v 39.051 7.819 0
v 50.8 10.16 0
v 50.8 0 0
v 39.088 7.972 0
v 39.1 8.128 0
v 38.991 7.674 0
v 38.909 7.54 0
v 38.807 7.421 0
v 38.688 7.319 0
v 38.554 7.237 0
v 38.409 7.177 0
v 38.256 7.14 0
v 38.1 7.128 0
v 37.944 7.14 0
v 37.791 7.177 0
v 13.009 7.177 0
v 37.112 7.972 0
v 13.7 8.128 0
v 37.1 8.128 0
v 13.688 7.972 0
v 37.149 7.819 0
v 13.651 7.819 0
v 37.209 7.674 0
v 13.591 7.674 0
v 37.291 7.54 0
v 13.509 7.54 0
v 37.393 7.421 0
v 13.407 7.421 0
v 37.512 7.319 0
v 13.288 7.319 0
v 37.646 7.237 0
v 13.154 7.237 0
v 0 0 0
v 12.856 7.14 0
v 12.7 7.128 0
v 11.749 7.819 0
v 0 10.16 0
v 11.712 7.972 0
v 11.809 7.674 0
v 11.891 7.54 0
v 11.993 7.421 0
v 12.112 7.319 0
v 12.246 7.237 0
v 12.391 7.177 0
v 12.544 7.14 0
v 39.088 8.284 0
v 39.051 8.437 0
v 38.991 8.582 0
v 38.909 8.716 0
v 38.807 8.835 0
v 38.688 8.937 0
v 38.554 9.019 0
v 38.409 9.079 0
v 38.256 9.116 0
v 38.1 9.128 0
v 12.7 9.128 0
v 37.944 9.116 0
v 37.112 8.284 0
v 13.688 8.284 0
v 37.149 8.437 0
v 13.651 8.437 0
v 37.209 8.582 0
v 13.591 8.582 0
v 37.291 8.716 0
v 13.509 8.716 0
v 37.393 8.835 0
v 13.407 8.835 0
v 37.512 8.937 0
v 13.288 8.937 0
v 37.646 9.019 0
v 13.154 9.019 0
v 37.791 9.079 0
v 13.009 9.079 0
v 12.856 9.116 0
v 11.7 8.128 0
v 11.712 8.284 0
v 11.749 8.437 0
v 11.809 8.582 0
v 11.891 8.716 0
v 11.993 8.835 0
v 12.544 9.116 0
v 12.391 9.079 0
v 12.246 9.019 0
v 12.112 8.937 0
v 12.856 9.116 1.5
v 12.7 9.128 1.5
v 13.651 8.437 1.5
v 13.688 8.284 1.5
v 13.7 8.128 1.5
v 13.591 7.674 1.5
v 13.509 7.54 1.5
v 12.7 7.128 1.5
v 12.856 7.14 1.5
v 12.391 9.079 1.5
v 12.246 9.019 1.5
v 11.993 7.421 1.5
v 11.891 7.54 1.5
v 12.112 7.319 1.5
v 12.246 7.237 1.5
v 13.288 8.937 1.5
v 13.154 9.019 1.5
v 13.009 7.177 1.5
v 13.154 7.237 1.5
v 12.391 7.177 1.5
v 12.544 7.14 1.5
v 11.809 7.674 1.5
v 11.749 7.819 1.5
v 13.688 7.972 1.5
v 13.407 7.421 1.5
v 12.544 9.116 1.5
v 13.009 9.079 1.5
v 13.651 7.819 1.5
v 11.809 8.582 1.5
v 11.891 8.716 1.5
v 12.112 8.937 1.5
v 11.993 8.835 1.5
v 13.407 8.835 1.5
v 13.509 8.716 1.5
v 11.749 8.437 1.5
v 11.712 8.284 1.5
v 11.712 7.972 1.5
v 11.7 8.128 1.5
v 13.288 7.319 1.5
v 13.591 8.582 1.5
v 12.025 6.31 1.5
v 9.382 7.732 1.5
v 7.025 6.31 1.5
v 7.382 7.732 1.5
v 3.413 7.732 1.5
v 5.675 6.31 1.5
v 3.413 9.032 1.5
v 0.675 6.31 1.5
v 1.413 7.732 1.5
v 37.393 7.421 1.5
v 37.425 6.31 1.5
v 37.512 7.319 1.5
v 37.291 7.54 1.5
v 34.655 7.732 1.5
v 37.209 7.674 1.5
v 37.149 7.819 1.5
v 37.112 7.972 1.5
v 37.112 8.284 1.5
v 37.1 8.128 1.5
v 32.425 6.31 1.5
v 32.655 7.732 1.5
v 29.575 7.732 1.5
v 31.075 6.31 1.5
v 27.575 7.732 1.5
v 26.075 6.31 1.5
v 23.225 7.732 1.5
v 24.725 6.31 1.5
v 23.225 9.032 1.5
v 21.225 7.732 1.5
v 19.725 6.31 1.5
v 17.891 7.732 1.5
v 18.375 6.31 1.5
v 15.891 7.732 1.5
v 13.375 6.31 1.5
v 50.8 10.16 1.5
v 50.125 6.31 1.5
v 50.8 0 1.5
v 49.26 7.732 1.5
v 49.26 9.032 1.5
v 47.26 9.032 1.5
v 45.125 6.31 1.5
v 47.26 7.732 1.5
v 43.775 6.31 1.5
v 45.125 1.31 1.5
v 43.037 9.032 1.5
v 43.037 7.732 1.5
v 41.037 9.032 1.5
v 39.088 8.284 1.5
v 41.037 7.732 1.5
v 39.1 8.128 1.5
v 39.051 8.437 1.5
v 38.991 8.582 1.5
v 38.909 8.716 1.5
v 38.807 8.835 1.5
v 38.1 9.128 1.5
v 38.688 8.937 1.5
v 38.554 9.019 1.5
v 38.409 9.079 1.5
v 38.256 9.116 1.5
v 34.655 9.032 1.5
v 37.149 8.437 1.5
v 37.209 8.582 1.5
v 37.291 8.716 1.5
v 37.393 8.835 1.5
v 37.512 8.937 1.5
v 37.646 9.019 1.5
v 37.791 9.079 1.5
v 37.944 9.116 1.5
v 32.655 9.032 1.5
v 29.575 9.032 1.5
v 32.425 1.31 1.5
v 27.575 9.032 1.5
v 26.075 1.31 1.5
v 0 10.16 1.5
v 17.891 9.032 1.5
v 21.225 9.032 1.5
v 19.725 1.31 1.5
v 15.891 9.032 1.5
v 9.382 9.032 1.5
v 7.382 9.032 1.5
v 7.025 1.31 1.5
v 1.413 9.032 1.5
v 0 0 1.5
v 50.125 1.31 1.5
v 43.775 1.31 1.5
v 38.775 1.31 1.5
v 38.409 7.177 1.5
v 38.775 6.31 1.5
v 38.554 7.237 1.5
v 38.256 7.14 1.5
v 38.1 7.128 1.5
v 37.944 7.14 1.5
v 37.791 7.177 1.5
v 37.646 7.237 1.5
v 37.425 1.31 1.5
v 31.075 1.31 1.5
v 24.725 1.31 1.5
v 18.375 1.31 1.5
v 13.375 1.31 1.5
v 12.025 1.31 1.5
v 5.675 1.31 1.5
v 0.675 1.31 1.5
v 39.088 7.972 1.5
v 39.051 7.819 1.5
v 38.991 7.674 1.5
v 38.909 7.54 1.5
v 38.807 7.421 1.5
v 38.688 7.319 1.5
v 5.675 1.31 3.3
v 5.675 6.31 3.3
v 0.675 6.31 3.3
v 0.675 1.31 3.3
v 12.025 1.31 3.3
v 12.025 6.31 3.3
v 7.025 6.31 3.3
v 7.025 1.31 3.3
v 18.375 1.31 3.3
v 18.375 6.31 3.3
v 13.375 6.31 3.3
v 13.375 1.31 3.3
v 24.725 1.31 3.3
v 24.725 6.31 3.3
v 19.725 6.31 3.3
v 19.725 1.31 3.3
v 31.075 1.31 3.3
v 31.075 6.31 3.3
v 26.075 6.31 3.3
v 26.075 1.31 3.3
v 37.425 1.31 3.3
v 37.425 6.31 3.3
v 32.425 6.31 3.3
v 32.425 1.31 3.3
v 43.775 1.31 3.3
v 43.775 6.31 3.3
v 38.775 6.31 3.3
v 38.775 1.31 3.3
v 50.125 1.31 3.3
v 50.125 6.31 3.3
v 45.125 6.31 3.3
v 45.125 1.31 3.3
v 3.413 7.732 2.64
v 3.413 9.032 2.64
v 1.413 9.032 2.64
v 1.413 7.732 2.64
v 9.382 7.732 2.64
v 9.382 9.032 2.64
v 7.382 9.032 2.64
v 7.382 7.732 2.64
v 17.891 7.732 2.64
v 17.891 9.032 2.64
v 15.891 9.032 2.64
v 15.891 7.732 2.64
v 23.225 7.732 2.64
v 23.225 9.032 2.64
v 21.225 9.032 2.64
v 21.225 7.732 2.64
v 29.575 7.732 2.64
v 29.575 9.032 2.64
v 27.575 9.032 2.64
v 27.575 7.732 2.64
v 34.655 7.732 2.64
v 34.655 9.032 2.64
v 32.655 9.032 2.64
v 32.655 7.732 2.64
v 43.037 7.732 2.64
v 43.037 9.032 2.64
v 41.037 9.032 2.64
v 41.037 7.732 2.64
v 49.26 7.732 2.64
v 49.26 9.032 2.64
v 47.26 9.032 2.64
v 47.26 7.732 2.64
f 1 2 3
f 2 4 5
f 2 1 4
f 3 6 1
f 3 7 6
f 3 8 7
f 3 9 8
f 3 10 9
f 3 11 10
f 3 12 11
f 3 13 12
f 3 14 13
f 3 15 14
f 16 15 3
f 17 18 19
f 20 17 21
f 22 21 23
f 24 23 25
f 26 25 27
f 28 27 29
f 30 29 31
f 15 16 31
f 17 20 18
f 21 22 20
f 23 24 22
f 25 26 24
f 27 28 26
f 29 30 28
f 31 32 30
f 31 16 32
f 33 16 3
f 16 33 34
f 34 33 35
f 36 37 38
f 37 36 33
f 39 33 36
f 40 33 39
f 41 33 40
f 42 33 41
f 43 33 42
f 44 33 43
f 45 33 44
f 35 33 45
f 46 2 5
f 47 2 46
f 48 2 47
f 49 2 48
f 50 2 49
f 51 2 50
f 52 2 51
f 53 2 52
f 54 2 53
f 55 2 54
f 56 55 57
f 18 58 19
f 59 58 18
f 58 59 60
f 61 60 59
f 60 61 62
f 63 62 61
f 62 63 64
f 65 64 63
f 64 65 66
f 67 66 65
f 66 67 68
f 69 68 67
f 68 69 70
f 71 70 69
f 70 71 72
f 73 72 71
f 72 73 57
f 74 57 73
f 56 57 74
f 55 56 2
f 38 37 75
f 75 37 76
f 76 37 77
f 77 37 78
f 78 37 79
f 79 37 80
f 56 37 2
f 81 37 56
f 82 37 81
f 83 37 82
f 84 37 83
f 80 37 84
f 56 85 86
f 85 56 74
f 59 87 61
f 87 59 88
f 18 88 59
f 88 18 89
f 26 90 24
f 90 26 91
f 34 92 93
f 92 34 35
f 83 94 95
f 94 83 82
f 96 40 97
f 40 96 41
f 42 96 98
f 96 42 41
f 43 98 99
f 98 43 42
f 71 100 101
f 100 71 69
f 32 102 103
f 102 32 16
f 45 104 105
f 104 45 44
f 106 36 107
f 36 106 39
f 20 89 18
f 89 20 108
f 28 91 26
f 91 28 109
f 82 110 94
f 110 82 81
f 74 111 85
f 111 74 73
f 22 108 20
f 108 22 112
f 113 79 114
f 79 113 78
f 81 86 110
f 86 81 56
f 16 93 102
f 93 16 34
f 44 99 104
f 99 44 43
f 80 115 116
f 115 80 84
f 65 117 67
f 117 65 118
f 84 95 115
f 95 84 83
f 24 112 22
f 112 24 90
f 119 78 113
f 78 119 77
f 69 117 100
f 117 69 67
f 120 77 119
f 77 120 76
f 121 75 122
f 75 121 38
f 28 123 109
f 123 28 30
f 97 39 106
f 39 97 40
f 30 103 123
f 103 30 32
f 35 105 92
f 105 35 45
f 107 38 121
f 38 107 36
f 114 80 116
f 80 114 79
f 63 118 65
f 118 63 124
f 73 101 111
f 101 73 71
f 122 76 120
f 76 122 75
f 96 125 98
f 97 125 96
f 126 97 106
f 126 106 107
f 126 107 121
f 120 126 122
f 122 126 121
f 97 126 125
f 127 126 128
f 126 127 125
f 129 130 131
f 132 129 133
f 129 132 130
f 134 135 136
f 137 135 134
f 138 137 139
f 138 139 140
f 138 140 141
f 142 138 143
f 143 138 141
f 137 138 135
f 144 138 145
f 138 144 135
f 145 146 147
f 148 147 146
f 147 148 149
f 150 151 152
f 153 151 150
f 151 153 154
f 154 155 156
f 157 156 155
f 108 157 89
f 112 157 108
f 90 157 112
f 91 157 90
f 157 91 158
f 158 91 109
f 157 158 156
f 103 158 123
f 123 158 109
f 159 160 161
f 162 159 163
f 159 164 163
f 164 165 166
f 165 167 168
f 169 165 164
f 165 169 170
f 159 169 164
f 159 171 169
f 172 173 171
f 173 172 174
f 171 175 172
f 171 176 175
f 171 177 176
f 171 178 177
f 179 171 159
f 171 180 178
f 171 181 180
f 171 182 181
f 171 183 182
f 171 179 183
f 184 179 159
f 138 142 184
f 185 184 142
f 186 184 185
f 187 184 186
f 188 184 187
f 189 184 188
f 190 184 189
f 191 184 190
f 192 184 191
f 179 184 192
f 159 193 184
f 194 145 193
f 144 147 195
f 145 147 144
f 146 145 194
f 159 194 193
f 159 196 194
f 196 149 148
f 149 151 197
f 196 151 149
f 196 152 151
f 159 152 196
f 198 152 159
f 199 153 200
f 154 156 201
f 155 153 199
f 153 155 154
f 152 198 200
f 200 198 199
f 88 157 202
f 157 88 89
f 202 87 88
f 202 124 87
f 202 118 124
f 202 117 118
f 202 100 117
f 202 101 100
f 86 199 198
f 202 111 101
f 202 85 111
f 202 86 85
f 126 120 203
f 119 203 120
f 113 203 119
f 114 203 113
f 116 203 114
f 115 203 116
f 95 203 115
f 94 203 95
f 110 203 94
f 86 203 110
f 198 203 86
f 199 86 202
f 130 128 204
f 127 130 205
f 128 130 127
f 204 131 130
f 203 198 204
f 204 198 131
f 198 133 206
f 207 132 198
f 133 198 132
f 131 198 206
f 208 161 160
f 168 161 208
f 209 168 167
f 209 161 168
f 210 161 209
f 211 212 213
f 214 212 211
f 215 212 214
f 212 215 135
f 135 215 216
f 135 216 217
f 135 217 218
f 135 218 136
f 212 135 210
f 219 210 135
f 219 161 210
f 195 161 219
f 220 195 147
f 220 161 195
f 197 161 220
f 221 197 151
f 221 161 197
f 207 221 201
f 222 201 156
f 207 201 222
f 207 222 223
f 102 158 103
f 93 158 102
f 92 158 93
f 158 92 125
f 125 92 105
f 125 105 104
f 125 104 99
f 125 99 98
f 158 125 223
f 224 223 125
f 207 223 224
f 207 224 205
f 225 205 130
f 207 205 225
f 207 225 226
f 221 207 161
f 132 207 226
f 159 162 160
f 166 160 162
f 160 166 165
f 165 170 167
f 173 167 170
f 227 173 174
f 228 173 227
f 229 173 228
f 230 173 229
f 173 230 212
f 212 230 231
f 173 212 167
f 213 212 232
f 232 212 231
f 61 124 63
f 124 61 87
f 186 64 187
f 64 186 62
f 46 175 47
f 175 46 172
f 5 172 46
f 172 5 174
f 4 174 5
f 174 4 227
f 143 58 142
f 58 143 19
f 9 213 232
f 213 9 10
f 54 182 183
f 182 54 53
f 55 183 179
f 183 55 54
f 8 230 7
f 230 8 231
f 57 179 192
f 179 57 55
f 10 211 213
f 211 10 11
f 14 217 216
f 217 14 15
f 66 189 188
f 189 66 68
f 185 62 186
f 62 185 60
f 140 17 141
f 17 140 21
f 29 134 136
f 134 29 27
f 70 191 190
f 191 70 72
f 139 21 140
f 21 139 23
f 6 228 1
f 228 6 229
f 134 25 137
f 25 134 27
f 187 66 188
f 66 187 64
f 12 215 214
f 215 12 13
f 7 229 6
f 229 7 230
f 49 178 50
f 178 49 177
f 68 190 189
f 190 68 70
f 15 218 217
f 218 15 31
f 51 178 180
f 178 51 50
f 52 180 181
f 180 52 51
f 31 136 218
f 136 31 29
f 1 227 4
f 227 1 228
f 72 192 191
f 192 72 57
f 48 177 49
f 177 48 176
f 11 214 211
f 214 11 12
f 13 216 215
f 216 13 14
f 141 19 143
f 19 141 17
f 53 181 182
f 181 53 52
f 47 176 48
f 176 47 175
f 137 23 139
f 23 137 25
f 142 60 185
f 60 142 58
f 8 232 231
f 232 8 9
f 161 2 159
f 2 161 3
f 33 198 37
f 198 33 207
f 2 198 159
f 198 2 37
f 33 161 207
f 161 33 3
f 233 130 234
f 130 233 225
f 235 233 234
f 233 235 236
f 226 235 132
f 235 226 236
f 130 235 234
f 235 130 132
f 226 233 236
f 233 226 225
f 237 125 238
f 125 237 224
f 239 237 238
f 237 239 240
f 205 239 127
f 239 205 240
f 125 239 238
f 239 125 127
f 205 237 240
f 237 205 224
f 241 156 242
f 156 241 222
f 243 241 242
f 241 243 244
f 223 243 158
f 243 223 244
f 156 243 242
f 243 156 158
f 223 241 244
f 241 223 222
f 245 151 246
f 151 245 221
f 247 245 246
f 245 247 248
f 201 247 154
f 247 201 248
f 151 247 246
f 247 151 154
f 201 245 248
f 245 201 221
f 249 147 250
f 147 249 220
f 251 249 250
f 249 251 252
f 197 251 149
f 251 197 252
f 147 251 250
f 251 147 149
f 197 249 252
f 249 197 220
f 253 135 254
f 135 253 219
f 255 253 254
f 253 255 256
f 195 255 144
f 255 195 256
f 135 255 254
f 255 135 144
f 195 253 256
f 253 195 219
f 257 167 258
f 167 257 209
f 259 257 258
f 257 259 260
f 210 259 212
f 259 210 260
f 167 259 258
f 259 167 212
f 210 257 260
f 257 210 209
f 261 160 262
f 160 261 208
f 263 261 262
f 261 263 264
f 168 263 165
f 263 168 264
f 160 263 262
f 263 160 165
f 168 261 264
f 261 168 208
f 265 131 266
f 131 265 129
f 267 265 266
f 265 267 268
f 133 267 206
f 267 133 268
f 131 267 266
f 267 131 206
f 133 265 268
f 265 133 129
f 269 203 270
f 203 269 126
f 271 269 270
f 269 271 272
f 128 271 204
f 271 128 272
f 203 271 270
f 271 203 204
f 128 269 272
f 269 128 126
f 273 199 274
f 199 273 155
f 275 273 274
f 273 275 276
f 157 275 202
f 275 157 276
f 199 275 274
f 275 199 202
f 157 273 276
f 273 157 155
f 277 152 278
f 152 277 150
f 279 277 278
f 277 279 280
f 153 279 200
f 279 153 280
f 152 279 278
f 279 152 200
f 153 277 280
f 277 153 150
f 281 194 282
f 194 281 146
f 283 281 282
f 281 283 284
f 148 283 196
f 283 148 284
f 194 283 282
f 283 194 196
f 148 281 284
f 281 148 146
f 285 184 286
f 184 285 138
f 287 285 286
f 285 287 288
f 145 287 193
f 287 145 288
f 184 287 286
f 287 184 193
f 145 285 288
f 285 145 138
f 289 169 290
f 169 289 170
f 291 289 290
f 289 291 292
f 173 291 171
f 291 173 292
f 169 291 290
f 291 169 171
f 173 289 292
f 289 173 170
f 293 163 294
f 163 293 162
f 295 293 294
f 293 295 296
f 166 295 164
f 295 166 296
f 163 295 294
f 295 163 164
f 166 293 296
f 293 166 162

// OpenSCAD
// ****************************************************************************
//
// File: neopixel_x8_stick_assy_animate.scad
//
// Description:
//   Top-level Assembly Animation for Adafruit "NeoPixel 8 Stick" products,
//   along with a wiring harness and front/back case halves for
//   mounting of the NeoPixel Stick to other projects.
//
//   Comment out various design entities in the 'union()' block below
//   in order to perform fit-checks and visualize how the overall assembly
//   is put together.
//
// Author: Keith Pflieger
// Date:   April 2021
// License: CC BY-NC-SA 4.0
//          (Creative Commons: Attribution-NonCommercial-ShareAlike)
// Thingiverse user: RoboticDreams
// github: pfliegster (https://github.com/pfliegster)
//
// ****************************************************************************

$include_front = true;
include <../neopixel_x8_stick_case_front.scad>

$include_back = true;
include <../neopixel_x8_stick_case_back.scad>

$include_pwb = true;
include <../neopixel_x8_stick_pwb.scad>

$include_wiring_harness = true;
include <../neopixel_wiring_harness.scad>

// Set various enclosure options here:
screw_case = true;      // 'true' for screw-in version of enclosure, 'false' for simple enclosure
screw_type = "flat";    // set enclosure screw type to "none", "round", "cylinder" or "flat"
flush_case = true;      // Used to modify back enclosure piece to be flush with the top around the perimeter
case_screw_length = 10; // length of the physical mounting screws
include_screws = true;  // include M3 screws for assembly visualization?
include_nuts = true;    // include M3 nuts for assembly visualization?
case_thickness = 10.25; // Overall Enclosure thickness (front and back parts assembled)
case_screw_separation = 60.0;     // Center-to-Center distance of the two case mounting screws
add_back_mounting_screws = false; // Add Mounting screws to back enclosure part

// Derived variables:
case_screw_offset = (case_screw_separation - ada_nps8_pwb_length)/2;
back_surface_z = case_thickness - front_surface_z;

// Computed Positions for Mounting Hardware:
case_screw1_pos = [  -case_screw_offset,
                    ada_nps8_pwb_width/2,
                    ada_nps8_pwb_height + front_surface_z - case_screw_length];
case_screw2_pos = [  ada_nps8_pwb_length + case_screw_offset,
                    ada_nps8_pwb_width/2,
                    ada_nps8_pwb_height + front_surface_z - case_screw_length];
case_nut1_pos = [    -case_screw_offset,
                    ada_nps8_pwb_width/2,
                    ada_nps8_pwb_height - back_surface_z];
case_nut2_pos = [    ada_nps8_pwb_length + case_screw_offset,
                    ada_nps8_pwb_width/2,
                    ada_nps8_pwb_height - back_surface_z];

// The constants which will drive the various animation steps:
// Start with display of PWB Only
anim_t1 = 0.1;
// Next, Add Wiring Harness with Z offset and slowly move into place next to PWB
anim_t2 = 0.2;
anim_delta2 = anim_t2 - anim_t1;
anim_off_z2 = -20;
// Then, Add Enclosure Back part, offset and rotated to start
anim_t3 = 0.3;
anim_delta3 = anim_t3 - anim_t2;
anim_off_z3 = -40;
anim_rot_z3 = -90;
// ... start moving back enclosure towards PWB past connector backshell
anim_t4 = 0.4;
anim_delta4 = anim_t4 - anim_t3;
anim_off_z4 = -40;
anim_rot_z4 = -90;
// ... then rotate part to be aligned with PWB again once past the connector
anim_t5 = 0.5;
anim_delta5 = anim_t5 - anim_t4;
anim_off_z5 = -15;
anim_rot_z5 = anim_rot_z4;
// ... and finally move Back part into position with PWB sitting inside of it.
anim_t6 = 0.55;
anim_delta6 = anim_t6 - anim_t5;
anim_off_z6 = -5;
// Now Add Enclosure Front part with Z offset
anim_t7 = 0.6;
anim_delta7 = anim_t7 - anim_t6;
anim_off_z7 = 25;
// Fade transparency on front part ...
anim_t8 = 0.65;
anim_delta8 = anim_t8 - anim_t7;
// Finally, Move enclosure front part into place on top of the rest of the assembly
anim_t9 = 0.75;
anim_delta9 = anim_t9 - anim_t8;
anim_off_z9 = 25;
// Fade transparency back off on front part ...
anim_t10 = 0.80;
anim_delta10 = anim_t10 - anim_t9;

// Animation constants for mounting hardware:
anim_s1_viz = 0.75;
anim_s2_viz = 0.77;
anim_n1_viz = 0.79;
anim_n2_viz = 0.81;
anim_s1_start = 0.79;
anim_s2_start = 0.82;
anim_n1_start = 0.82;
anim_n2_start = 0.85;
anim_s1_end = 0.89;
anim_s2_end = 0.92;
anim_n1_end = 0.89;
anim_n2_end = 0.92;
anim_s1_delta = anim_s1_end - anim_s1_start;
anim_s2_delta = anim_s2_end - anim_s2_start;
anim_n1_delta = anim_n1_end - anim_n1_start;
anim_n2_delta = anim_n2_end - anim_n2_start;
anim_s1_z_offset = 20;
anim_s2_z_offset = 20;
anim_n1_z_offset = -13;
anim_n2_z_offset = -13;

union() {
    // The PWB is always there and stationary:
    if ($include_pwb) ada_nps8_pwb_model($fn=40);

    // Animate the Wiring Harness Model:
    if ($include_wiring_harness) {
        if ($t > anim_t1) {
            translate([0, 0, ($t<anim_t2)?
                anim_off_z2*(1 - ($t - anim_t1)/anim_delta2) : 0])
                neopixel_wiring_harness( num_conductor = 4, harness_length = 20,
                                connector_type = "socket", $fn=40);
        } else if ($t > 0.75*anim_t1) {
            translate([0, 0, anim_off_z2])
                neopixel_wiring_harness( num_conductor = 4, harness_length = 20,
                                connector_type = "socket", $fn=40);
        }
    }
    
    // Animate the Enclosure Back Model Part in multi-stages:
    if ($include_back) {
        if ($t > anim_t5) {
            translate([0, 0, ($t<anim_t6)? anim_off_z6*(1 - ($t - anim_t5)/anim_delta6) : 0])
                neopixel_stick_case_back (
                    screw_case = screw_case,
                    case_screw_separation = case_screw_separation,
                    case_thickness = case_thickness,
                    add_back_mounting_screws = add_back_mounting_screws,
                    flush_perim = flush_case,
                    include_nut_pocket = true,
                    nut_pocket_depth = 3.5,
                    back_alpha = 1.0
                );
        } else if ($t > anim_t4) {
            translate([ada_nps8_pwb_length/2, ada_nps8_pwb_width/2, 0]) {
                rotate([0, 0, ($t<anim_t5)? anim_rot_z5*(1 - ($t - anim_t4)/anim_delta5) : 0]) {
                    translate([-ada_nps8_pwb_length/2, -ada_nps8_pwb_width/2, 
                        (anim_off_z5-anim_off_z6)*(1 - ($t - anim_t4)/anim_delta5) + anim_off_z6])
                        neopixel_stick_case_back (
                            screw_case = screw_case,
                            case_screw_separation = case_screw_separation,
                            case_thickness = case_thickness,
                            add_back_mounting_screws = add_back_mounting_screws,
                            flush_perim = flush_case,
                            include_nut_pocket = true,
                            nut_pocket_depth = 3.5,
                            back_alpha = 1.0
                        );
                }
            }
        } else if ($t > anim_t3) {
            translate([ada_nps8_pwb_length/2, ada_nps8_pwb_width/2, 0]) {
                rotate([0, 0, anim_rot_z4]) {
                    translate([-ada_nps8_pwb_length/2, -ada_nps8_pwb_width/2, 
                        (anim_off_z4-anim_off_z5)*(1 - ($t - anim_t3)/anim_delta4) + anim_off_z5])
                        neopixel_stick_case_back (
                            screw_case = screw_case,
                            case_screw_separation = case_screw_separation,
                            case_thickness = case_thickness,
                            add_back_mounting_screws = add_back_mounting_screws,
                            flush_perim = flush_case,
                            include_nut_pocket = true,
                            nut_pocket_depth = 3.5,
                            back_alpha = 1.0
                        );
                }
            }
        } else if ($t > anim_t2 + 0.75*anim_delta3) {
            translate([ada_nps8_pwb_length/2, ada_nps8_pwb_width/2, 0]) {
                rotate([0, 0, anim_rot_z3]) {
                    translate([-ada_nps8_pwb_length/2, -ada_nps8_pwb_width/2, anim_off_z3])
                        neopixel_stick_case_back (
                            screw_case = screw_case,
                            case_screw_separation = case_screw_separation,
                            case_thickness = case_thickness,
                            add_back_mounting_screws = add_back_mounting_screws,
                            flush_perim = flush_case,
                            include_nut_pocket = true,
                            nut_pocket_depth = 3.5,
                            back_alpha = 1.0
                        );
                }
            }
        }
    }
    
    // Animate the Enclosure Front Model Part:
    if ($include_front) {
        if ($t > anim_t10) {
            neopixel_stick_case_front(
                screw_case = screw_case,
                screw_type = screw_type,
                case_screw_separation = case_screw_separation,
                front_alpha = 1.0);
        } else if ($t > anim_t9) {
            neopixel_stick_case_front(
                screw_case = screw_case,
                screw_type = screw_type,
                case_screw_separation = case_screw_separation,
                front_alpha = 0.5 + 0.5*($t-anim_t9)/anim_delta10 );
        } else if ($t > anim_t8) {
            translate([0, 0, ($t<anim_t9)? anim_off_z9*(1 - ($t - anim_t8)/anim_delta9) : 0])
                neopixel_stick_case_front(
                    screw_case = screw_case,
                    screw_type = screw_type,
                    case_screw_separation = case_screw_separation,
                    front_alpha = 0.5);
        } else if ($t > anim_t7) {
            translate([0, 0, anim_off_z7])
                neopixel_stick_case_front(
                    screw_case = screw_case,
                    screw_type = screw_type,
                    case_screw_separation = case_screw_separation,
                    front_alpha = 1.0 - 0.5*($t-anim_t7)/anim_delta8 );
        } else if ($t > anim_t6 + 0.75*anim_delta7) {
            translate([0, 0, anim_off_z7])
                neopixel_stick_case_front(
                    screw_case = screw_case,
                    screw_type = screw_type,
                    case_screw_separation = case_screw_separation,
                    front_alpha = 1.0);
        }
    }
    
    // Animate the Enclosure Mounting Hardware:
    if (include_screws) {
        color(c = [0.2, 0.2, 0.2] , alpha = 1.0) {
            if ($t > anim_s1_end) {
                translate(case_screw1_pos)
                    generic_screw_model(screw_diam = 2.9, screw_type = screw_type, length = 10, $fn=80);
            } else if ($t >= anim_s1_start) {
                translate([0, 0, anim_s1_z_offset*(1 - ($t - anim_s1_start)/anim_s1_delta)]) {
                    translate(case_screw1_pos)
                        generic_screw_model(screw_diam = 2.9, screw_type = screw_type, length = 10, $fn=80);
                }
            } else if ($t >= anim_s1_viz) {
                translate([0, 0, anim_s1_z_offset]) {
                    translate(case_screw1_pos)
                        generic_screw_model(screw_diam = 2.9, screw_type = screw_type, length = 10, $fn=80);
                }
            }

            if ($t > anim_s2_end) {
                translate(case_screw2_pos)
                    generic_screw_model(screw_diam = 2.9, screw_type = screw_type, length = 10, $fn=80);
            } else if ($t >= anim_s2_start) {
                translate([0, 0, anim_s2_z_offset*(1 - ($t - anim_s2_start)/anim_s2_delta)]) {
                    translate(case_screw2_pos)
                        generic_screw_model(screw_diam = 2.9, screw_type = screw_type, length = 10, $fn=80);
                }
            } else if ($t >= anim_s2_viz) {
                translate([0, 0, anim_s2_z_offset]) {
                    translate(case_screw2_pos)
                        generic_screw_model(screw_diam = 2.9, screw_type = screw_type, length = 10, $fn=80);
                }
            }
        }
    }
    if (include_nuts) {
        color(c = [0.2, 0.2, 0.2] , alpha = 1.0) {
            if ($t > anim_n1_end) {
                render() translate(case_nut1_pos) m3_nut(outer_diameter = 6.4);
            } else if ($t >= anim_n1_start) {
                translate([0, 0, anim_n1_z_offset*(1 - ($t - anim_n1_start)/anim_n1_delta)]) {
                    render() translate(case_nut1_pos) m3_nut(outer_diameter = 6.4);
                }
            } else if ($t >= anim_n1_viz) {
                translate([0, 0, anim_n1_z_offset]) {
                    render() translate(case_nut1_pos) m3_nut(outer_diameter = 6.4);
                }
            }

            if ($t > anim_n2_end) {
                render() translate(case_nut2_pos) m3_nut(outer_diameter = 6.4);
            } else if ($t >= anim_n2_start) {
                translate([0, 0, anim_n2_z_offset*(1 - ($t - anim_n2_start)/anim_n2_delta)]) {
                    render() translate(case_nut2_pos) m3_nut(outer_diameter = 6.4);
                }
            } else if ($t >= anim_n2_viz) {
                translate([0, 0, anim_n2_z_offset]) {
                    render() translate(case_nut2_pos) m3_nut(outer_diameter = 6.4);
                }
            }
        }
    }
    
}
